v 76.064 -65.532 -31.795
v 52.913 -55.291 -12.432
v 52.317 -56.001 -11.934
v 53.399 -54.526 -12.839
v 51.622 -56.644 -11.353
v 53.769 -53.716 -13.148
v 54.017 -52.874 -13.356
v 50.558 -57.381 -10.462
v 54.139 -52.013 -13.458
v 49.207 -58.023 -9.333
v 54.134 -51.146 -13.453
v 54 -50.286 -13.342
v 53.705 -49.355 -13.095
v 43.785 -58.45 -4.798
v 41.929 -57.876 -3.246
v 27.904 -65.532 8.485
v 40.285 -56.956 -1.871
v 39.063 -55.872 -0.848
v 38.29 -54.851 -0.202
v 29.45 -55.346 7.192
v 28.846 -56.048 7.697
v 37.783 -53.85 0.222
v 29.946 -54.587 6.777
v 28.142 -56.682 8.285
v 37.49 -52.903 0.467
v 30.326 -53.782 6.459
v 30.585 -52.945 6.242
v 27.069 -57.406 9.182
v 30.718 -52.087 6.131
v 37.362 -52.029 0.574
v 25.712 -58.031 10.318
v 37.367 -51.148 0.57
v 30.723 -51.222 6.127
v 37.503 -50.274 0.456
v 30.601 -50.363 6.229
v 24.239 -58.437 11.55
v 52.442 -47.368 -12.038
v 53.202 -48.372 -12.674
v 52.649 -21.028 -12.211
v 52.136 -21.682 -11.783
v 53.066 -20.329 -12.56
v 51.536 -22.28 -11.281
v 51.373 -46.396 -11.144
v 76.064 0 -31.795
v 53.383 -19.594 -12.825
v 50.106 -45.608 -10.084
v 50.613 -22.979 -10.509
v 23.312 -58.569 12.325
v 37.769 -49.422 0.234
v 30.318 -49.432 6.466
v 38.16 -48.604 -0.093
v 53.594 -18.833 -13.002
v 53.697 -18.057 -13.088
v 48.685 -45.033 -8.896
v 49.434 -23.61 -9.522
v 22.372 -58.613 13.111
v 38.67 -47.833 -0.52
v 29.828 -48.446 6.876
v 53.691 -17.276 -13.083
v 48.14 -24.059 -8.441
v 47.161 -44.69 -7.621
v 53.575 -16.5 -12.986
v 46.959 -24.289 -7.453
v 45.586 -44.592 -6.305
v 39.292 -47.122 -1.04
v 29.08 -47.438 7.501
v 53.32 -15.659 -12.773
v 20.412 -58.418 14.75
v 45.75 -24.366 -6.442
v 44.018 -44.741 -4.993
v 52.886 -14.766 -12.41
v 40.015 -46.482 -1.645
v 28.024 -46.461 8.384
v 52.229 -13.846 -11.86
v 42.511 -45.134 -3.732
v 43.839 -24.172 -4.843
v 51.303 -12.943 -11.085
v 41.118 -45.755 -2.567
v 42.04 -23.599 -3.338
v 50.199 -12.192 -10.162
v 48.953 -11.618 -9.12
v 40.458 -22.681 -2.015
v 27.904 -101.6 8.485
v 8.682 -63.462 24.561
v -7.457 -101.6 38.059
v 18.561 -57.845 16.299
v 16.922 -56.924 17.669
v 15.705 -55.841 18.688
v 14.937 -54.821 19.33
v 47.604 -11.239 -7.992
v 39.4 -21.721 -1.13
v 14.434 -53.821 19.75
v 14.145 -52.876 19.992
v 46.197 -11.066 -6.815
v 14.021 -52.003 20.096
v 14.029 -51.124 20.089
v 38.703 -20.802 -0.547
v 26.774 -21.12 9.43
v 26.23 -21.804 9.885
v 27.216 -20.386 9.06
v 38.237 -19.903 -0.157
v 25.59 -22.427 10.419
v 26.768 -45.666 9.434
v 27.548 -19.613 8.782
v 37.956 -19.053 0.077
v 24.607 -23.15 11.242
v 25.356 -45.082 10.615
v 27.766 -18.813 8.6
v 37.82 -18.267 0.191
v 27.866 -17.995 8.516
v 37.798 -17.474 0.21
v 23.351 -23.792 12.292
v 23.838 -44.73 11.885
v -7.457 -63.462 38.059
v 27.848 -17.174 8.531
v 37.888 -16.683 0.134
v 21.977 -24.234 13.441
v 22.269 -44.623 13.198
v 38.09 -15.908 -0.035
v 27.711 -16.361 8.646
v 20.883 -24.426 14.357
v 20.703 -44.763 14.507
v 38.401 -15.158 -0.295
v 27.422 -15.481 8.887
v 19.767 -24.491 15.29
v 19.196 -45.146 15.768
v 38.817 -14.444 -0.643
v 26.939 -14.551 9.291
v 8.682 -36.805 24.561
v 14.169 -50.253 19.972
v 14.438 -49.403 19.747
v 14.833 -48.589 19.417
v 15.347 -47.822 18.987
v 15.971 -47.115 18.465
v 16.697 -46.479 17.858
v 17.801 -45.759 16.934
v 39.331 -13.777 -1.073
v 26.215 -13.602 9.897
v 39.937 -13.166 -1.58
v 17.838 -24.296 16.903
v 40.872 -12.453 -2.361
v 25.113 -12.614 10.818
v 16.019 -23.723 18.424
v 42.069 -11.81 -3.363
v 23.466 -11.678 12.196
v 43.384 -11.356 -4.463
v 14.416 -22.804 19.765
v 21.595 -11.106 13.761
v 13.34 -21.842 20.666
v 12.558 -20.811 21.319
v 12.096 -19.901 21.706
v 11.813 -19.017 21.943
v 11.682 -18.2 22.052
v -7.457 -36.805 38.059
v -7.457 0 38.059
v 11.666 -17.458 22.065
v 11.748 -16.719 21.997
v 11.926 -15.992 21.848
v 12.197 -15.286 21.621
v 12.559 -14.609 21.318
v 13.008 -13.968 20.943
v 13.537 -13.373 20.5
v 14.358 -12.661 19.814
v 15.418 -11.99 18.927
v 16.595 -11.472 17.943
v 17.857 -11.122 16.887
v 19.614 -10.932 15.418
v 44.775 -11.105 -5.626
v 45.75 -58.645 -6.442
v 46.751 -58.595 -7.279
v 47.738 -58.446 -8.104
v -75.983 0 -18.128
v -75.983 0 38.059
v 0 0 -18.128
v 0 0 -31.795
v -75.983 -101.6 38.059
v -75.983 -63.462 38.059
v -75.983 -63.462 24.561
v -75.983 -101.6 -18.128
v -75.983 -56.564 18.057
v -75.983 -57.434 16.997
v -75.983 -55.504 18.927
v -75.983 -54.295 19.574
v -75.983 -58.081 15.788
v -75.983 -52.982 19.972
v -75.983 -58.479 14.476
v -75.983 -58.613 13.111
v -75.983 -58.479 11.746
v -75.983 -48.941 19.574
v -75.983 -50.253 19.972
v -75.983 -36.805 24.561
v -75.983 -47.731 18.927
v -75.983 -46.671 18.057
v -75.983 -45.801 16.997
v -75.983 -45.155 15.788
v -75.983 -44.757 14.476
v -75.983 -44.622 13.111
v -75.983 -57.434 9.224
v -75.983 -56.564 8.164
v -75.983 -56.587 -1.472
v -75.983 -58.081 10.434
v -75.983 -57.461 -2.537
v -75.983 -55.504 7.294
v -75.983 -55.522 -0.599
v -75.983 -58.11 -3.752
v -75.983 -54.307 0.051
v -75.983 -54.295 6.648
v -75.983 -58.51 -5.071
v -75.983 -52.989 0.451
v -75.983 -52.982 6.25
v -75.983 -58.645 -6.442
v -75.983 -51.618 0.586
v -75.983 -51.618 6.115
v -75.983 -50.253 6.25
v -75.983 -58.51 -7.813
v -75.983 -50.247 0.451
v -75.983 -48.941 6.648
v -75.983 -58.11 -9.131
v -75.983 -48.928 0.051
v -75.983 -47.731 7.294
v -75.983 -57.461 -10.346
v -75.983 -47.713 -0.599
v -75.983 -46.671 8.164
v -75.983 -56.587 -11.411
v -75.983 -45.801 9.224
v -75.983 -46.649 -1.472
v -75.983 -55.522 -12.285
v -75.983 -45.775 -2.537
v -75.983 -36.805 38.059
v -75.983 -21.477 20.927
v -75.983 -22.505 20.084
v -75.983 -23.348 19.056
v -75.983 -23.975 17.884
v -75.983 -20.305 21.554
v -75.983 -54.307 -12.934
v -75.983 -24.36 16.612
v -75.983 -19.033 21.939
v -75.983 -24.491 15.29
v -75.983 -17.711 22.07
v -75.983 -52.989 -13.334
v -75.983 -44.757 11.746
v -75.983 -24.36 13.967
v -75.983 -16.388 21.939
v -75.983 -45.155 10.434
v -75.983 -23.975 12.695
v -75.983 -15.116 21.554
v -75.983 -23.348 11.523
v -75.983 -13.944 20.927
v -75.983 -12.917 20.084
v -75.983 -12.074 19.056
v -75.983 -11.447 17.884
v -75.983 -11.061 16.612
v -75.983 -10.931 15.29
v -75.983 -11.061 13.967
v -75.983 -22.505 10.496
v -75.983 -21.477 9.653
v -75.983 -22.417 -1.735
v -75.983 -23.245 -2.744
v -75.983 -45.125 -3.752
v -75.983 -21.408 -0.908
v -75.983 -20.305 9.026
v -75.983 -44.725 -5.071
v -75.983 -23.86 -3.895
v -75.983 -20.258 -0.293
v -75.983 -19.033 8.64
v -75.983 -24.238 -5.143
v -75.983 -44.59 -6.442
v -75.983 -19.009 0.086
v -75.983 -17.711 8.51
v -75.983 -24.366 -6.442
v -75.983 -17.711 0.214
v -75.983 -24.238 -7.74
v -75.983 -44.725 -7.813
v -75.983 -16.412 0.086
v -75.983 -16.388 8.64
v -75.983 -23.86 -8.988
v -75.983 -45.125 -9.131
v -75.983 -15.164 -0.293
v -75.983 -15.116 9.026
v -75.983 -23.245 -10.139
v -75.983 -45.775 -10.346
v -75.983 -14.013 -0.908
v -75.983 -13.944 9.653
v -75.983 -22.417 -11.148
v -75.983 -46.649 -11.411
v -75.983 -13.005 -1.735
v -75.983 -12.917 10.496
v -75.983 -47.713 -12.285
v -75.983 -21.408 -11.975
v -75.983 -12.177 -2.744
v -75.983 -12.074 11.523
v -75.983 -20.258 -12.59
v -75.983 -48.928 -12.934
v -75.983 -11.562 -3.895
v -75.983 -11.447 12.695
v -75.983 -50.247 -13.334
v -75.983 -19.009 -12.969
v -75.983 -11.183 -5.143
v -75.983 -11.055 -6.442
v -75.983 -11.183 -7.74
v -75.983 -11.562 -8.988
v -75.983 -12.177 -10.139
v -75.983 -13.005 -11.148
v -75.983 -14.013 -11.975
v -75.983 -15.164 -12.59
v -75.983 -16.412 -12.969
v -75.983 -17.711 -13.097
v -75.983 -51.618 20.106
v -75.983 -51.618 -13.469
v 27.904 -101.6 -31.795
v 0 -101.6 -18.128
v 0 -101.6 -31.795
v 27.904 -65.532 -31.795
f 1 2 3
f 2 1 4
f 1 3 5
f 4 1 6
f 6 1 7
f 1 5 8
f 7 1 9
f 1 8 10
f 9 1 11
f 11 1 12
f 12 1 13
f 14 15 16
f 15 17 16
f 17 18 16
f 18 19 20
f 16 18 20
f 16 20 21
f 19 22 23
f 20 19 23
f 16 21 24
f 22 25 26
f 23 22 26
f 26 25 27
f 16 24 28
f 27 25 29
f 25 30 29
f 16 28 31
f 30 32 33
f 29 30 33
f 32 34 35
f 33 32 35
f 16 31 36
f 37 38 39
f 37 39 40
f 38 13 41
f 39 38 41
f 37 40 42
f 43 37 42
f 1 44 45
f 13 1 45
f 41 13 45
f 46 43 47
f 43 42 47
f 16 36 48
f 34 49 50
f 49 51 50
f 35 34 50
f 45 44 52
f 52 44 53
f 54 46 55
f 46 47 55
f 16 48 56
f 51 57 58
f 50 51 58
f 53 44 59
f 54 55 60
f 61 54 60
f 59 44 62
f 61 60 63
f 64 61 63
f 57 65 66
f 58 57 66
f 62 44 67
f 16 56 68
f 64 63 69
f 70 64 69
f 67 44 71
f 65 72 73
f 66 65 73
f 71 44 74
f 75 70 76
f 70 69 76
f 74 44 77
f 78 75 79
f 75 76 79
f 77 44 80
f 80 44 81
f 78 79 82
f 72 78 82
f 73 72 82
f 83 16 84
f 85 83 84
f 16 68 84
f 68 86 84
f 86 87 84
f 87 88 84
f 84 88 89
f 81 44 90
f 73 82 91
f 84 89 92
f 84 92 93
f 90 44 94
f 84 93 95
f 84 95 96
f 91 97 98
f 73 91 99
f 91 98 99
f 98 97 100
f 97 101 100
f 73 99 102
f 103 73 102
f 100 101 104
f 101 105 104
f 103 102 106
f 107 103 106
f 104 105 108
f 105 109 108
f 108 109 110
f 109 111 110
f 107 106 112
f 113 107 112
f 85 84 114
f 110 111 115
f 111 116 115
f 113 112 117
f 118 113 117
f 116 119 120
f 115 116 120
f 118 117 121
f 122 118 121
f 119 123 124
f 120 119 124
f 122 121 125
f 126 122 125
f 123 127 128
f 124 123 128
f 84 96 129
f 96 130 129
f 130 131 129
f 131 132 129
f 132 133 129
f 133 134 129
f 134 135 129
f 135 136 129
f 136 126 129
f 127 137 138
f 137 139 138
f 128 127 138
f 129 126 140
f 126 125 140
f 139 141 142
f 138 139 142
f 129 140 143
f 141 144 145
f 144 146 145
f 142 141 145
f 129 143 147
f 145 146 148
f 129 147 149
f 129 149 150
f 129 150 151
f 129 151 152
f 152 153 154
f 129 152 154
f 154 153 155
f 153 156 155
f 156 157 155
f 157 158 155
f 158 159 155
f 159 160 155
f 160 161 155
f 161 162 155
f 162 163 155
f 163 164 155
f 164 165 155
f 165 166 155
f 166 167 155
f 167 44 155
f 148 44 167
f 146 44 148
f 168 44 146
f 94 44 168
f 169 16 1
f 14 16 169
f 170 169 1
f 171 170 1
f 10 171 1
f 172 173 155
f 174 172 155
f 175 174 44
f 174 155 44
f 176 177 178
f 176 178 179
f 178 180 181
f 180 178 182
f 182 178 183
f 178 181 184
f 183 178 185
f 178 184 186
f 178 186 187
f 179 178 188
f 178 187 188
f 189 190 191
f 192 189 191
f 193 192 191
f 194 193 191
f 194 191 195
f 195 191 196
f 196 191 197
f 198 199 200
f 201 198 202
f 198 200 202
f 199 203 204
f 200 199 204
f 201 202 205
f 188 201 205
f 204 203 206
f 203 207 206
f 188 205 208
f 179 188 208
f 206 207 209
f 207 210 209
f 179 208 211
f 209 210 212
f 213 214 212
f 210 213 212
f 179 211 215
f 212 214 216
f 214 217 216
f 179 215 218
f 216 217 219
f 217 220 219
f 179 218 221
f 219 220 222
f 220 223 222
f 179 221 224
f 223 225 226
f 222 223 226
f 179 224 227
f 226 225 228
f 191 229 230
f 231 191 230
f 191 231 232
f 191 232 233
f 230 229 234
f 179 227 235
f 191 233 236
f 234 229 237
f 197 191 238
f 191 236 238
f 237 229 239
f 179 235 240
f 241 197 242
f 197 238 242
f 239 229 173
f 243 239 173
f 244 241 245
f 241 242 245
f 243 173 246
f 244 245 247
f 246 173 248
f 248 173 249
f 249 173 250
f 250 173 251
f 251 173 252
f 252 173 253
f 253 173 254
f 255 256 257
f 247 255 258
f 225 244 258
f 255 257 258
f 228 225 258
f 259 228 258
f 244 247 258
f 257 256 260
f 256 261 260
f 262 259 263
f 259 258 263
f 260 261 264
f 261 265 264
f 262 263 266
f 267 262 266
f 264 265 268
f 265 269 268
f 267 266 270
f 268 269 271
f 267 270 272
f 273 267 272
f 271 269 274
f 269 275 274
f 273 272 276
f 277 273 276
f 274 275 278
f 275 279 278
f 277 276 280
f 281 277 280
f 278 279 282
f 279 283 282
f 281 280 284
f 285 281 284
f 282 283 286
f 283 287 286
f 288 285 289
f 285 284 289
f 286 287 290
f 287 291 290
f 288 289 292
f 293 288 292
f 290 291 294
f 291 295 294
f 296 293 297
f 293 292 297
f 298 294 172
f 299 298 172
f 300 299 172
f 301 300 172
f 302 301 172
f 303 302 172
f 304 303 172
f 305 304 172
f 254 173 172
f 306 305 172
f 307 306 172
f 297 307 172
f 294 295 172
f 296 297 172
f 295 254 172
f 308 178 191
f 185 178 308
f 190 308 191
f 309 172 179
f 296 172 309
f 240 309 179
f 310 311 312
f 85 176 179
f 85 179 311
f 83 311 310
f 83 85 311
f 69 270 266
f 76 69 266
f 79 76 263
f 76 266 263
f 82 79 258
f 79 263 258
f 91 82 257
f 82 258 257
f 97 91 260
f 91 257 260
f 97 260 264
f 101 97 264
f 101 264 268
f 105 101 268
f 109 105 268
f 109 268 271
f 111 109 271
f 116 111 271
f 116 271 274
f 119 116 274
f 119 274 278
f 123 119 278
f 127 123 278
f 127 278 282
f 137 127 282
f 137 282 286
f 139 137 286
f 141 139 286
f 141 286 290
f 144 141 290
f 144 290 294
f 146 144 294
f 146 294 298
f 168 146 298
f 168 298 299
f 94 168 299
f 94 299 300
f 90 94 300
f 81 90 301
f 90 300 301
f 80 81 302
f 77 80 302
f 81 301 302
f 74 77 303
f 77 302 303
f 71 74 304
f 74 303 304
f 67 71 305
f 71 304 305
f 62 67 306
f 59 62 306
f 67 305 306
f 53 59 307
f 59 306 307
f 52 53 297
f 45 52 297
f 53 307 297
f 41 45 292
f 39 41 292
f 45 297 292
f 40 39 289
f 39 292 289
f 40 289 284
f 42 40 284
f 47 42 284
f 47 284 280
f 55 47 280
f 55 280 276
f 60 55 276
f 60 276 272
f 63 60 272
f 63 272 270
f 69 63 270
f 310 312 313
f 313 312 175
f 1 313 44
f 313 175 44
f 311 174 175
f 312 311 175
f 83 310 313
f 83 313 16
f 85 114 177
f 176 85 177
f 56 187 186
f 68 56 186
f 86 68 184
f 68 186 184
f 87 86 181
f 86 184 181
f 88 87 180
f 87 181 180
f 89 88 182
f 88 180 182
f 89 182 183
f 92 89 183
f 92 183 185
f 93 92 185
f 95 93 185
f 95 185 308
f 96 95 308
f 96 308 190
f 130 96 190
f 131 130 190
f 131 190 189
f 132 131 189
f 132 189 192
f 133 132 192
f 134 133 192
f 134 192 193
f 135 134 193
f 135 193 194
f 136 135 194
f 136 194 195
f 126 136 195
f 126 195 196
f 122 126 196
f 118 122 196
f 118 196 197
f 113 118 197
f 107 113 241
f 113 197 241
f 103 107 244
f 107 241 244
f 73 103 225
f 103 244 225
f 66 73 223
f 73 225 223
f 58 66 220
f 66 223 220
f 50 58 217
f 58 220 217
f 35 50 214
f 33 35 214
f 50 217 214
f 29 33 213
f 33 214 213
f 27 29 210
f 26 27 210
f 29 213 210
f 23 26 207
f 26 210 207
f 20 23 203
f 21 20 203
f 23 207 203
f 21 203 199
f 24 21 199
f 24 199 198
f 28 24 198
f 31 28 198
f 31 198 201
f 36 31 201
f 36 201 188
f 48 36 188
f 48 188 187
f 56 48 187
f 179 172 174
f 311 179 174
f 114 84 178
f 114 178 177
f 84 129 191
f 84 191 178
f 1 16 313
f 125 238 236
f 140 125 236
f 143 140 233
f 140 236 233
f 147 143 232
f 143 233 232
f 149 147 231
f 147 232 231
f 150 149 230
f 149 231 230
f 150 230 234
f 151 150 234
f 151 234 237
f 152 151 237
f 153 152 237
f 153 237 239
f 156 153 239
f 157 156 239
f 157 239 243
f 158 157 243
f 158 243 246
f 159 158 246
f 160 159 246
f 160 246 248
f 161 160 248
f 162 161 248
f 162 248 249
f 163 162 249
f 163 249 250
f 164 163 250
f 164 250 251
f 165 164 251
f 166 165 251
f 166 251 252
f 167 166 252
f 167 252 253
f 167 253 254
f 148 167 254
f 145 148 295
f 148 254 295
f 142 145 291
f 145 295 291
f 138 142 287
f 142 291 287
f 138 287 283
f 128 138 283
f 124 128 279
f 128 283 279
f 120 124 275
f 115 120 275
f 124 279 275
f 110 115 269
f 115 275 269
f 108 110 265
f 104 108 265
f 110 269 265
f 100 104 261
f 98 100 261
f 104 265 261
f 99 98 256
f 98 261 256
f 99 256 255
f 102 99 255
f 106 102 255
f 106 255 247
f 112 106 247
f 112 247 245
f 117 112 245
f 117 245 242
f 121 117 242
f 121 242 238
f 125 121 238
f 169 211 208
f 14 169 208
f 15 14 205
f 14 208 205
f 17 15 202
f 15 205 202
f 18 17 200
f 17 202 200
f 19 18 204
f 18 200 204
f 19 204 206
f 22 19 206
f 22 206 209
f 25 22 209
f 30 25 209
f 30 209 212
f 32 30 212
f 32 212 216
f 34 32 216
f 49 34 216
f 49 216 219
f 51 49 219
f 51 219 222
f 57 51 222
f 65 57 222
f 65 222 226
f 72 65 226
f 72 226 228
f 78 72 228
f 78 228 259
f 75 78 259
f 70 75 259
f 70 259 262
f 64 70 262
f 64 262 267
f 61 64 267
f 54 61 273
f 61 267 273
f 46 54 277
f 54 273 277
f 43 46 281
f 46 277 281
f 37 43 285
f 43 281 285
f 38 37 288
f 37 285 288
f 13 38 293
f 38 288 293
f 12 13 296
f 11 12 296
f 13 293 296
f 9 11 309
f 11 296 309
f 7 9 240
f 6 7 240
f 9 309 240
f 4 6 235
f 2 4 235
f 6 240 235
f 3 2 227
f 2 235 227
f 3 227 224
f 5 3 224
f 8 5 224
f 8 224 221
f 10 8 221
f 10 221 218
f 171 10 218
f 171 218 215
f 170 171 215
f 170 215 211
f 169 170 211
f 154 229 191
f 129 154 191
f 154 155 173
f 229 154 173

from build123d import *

# Parameters (mm, degrees)
F1_DEPTH = 101.6
F2_W     = 62.831107527
F2_H     = 56.3771557063
F3_DEPTH = 36.068
F4_W     = 26.6572609544
F4_H     = 13.4982671589
F4_H_2   = 14.6736167371
F5_DEPTH = 108.712
F6_R     = 7.0273260197
F6_R_2   = 6.9955111579
F6_R_3   = 6.6555032816
F6_R_4   = 6.7798018692
F7_DEPTH = 174.752


with BuildPart() as f1:
    # F0 (on Front) → F1 (new body)
    with BuildSketch(Plane.XZ):
        Polygon((-7.4572972953, 38.0593240261), (-75.9830623865, 38.0593240261), (-75.9830623865, -18.1280076504), (0, -18.1280076504), (0, -31.7951962352), (76.0644078255, -31.7951962352), align=None)
    extrude(amount=F1_DEPTH)

    # F2 (on face) → F3 (cut)
    with BuildSketch(Plane.XZ.offset(101.6)):
        with Locations((59.3193974346, -3.606618382)):
            Rectangle(F2_W, F2_H)
    extrude(amount=-F3_DEPTH, mode=Mode.SUBTRACT)

    # F4 (on face) → F5 (cut)
    with BuildSketch(Plane(origin=(-75.9830623865, 0, 0), x_dir=(0, -1, 0), z_dir=(-1, 0, 0))):
        with Locations((50.1333586872, 31.3101904467)):
            Rectangle(F4_W, F4_H)
        with Locations((50.1333586872, 45.3961323947)):
            Rectangle(F4_W, F4_H_2)
    extrude(amount=-F5_DEPTH, mode=Mode.SUBTRACT)

    # F6 (on face) → F7 (cut)
    with BuildSketch(Plane(origin=(-75.9830623865, 0, 0), x_dir=(0, -1, 0), z_dir=(-1, 0, 0))):
        with Locations((51.6176335514, -6.4415424131)):
            Circle(F6_R)
        with Locations((51.6176335514, 13.1108649075)):
            Circle(F6_R_2)
        with Locations((17.7108142525, -6.4415424131)):
            Circle(F6_R_3)
        with Locations((17.7108142525, 15.2898039669)):
            Circle(F6_R_4)
    extrude(amount=-F7_DEPTH, mode=Mode.SUBTRACT)


solid = f1.part
